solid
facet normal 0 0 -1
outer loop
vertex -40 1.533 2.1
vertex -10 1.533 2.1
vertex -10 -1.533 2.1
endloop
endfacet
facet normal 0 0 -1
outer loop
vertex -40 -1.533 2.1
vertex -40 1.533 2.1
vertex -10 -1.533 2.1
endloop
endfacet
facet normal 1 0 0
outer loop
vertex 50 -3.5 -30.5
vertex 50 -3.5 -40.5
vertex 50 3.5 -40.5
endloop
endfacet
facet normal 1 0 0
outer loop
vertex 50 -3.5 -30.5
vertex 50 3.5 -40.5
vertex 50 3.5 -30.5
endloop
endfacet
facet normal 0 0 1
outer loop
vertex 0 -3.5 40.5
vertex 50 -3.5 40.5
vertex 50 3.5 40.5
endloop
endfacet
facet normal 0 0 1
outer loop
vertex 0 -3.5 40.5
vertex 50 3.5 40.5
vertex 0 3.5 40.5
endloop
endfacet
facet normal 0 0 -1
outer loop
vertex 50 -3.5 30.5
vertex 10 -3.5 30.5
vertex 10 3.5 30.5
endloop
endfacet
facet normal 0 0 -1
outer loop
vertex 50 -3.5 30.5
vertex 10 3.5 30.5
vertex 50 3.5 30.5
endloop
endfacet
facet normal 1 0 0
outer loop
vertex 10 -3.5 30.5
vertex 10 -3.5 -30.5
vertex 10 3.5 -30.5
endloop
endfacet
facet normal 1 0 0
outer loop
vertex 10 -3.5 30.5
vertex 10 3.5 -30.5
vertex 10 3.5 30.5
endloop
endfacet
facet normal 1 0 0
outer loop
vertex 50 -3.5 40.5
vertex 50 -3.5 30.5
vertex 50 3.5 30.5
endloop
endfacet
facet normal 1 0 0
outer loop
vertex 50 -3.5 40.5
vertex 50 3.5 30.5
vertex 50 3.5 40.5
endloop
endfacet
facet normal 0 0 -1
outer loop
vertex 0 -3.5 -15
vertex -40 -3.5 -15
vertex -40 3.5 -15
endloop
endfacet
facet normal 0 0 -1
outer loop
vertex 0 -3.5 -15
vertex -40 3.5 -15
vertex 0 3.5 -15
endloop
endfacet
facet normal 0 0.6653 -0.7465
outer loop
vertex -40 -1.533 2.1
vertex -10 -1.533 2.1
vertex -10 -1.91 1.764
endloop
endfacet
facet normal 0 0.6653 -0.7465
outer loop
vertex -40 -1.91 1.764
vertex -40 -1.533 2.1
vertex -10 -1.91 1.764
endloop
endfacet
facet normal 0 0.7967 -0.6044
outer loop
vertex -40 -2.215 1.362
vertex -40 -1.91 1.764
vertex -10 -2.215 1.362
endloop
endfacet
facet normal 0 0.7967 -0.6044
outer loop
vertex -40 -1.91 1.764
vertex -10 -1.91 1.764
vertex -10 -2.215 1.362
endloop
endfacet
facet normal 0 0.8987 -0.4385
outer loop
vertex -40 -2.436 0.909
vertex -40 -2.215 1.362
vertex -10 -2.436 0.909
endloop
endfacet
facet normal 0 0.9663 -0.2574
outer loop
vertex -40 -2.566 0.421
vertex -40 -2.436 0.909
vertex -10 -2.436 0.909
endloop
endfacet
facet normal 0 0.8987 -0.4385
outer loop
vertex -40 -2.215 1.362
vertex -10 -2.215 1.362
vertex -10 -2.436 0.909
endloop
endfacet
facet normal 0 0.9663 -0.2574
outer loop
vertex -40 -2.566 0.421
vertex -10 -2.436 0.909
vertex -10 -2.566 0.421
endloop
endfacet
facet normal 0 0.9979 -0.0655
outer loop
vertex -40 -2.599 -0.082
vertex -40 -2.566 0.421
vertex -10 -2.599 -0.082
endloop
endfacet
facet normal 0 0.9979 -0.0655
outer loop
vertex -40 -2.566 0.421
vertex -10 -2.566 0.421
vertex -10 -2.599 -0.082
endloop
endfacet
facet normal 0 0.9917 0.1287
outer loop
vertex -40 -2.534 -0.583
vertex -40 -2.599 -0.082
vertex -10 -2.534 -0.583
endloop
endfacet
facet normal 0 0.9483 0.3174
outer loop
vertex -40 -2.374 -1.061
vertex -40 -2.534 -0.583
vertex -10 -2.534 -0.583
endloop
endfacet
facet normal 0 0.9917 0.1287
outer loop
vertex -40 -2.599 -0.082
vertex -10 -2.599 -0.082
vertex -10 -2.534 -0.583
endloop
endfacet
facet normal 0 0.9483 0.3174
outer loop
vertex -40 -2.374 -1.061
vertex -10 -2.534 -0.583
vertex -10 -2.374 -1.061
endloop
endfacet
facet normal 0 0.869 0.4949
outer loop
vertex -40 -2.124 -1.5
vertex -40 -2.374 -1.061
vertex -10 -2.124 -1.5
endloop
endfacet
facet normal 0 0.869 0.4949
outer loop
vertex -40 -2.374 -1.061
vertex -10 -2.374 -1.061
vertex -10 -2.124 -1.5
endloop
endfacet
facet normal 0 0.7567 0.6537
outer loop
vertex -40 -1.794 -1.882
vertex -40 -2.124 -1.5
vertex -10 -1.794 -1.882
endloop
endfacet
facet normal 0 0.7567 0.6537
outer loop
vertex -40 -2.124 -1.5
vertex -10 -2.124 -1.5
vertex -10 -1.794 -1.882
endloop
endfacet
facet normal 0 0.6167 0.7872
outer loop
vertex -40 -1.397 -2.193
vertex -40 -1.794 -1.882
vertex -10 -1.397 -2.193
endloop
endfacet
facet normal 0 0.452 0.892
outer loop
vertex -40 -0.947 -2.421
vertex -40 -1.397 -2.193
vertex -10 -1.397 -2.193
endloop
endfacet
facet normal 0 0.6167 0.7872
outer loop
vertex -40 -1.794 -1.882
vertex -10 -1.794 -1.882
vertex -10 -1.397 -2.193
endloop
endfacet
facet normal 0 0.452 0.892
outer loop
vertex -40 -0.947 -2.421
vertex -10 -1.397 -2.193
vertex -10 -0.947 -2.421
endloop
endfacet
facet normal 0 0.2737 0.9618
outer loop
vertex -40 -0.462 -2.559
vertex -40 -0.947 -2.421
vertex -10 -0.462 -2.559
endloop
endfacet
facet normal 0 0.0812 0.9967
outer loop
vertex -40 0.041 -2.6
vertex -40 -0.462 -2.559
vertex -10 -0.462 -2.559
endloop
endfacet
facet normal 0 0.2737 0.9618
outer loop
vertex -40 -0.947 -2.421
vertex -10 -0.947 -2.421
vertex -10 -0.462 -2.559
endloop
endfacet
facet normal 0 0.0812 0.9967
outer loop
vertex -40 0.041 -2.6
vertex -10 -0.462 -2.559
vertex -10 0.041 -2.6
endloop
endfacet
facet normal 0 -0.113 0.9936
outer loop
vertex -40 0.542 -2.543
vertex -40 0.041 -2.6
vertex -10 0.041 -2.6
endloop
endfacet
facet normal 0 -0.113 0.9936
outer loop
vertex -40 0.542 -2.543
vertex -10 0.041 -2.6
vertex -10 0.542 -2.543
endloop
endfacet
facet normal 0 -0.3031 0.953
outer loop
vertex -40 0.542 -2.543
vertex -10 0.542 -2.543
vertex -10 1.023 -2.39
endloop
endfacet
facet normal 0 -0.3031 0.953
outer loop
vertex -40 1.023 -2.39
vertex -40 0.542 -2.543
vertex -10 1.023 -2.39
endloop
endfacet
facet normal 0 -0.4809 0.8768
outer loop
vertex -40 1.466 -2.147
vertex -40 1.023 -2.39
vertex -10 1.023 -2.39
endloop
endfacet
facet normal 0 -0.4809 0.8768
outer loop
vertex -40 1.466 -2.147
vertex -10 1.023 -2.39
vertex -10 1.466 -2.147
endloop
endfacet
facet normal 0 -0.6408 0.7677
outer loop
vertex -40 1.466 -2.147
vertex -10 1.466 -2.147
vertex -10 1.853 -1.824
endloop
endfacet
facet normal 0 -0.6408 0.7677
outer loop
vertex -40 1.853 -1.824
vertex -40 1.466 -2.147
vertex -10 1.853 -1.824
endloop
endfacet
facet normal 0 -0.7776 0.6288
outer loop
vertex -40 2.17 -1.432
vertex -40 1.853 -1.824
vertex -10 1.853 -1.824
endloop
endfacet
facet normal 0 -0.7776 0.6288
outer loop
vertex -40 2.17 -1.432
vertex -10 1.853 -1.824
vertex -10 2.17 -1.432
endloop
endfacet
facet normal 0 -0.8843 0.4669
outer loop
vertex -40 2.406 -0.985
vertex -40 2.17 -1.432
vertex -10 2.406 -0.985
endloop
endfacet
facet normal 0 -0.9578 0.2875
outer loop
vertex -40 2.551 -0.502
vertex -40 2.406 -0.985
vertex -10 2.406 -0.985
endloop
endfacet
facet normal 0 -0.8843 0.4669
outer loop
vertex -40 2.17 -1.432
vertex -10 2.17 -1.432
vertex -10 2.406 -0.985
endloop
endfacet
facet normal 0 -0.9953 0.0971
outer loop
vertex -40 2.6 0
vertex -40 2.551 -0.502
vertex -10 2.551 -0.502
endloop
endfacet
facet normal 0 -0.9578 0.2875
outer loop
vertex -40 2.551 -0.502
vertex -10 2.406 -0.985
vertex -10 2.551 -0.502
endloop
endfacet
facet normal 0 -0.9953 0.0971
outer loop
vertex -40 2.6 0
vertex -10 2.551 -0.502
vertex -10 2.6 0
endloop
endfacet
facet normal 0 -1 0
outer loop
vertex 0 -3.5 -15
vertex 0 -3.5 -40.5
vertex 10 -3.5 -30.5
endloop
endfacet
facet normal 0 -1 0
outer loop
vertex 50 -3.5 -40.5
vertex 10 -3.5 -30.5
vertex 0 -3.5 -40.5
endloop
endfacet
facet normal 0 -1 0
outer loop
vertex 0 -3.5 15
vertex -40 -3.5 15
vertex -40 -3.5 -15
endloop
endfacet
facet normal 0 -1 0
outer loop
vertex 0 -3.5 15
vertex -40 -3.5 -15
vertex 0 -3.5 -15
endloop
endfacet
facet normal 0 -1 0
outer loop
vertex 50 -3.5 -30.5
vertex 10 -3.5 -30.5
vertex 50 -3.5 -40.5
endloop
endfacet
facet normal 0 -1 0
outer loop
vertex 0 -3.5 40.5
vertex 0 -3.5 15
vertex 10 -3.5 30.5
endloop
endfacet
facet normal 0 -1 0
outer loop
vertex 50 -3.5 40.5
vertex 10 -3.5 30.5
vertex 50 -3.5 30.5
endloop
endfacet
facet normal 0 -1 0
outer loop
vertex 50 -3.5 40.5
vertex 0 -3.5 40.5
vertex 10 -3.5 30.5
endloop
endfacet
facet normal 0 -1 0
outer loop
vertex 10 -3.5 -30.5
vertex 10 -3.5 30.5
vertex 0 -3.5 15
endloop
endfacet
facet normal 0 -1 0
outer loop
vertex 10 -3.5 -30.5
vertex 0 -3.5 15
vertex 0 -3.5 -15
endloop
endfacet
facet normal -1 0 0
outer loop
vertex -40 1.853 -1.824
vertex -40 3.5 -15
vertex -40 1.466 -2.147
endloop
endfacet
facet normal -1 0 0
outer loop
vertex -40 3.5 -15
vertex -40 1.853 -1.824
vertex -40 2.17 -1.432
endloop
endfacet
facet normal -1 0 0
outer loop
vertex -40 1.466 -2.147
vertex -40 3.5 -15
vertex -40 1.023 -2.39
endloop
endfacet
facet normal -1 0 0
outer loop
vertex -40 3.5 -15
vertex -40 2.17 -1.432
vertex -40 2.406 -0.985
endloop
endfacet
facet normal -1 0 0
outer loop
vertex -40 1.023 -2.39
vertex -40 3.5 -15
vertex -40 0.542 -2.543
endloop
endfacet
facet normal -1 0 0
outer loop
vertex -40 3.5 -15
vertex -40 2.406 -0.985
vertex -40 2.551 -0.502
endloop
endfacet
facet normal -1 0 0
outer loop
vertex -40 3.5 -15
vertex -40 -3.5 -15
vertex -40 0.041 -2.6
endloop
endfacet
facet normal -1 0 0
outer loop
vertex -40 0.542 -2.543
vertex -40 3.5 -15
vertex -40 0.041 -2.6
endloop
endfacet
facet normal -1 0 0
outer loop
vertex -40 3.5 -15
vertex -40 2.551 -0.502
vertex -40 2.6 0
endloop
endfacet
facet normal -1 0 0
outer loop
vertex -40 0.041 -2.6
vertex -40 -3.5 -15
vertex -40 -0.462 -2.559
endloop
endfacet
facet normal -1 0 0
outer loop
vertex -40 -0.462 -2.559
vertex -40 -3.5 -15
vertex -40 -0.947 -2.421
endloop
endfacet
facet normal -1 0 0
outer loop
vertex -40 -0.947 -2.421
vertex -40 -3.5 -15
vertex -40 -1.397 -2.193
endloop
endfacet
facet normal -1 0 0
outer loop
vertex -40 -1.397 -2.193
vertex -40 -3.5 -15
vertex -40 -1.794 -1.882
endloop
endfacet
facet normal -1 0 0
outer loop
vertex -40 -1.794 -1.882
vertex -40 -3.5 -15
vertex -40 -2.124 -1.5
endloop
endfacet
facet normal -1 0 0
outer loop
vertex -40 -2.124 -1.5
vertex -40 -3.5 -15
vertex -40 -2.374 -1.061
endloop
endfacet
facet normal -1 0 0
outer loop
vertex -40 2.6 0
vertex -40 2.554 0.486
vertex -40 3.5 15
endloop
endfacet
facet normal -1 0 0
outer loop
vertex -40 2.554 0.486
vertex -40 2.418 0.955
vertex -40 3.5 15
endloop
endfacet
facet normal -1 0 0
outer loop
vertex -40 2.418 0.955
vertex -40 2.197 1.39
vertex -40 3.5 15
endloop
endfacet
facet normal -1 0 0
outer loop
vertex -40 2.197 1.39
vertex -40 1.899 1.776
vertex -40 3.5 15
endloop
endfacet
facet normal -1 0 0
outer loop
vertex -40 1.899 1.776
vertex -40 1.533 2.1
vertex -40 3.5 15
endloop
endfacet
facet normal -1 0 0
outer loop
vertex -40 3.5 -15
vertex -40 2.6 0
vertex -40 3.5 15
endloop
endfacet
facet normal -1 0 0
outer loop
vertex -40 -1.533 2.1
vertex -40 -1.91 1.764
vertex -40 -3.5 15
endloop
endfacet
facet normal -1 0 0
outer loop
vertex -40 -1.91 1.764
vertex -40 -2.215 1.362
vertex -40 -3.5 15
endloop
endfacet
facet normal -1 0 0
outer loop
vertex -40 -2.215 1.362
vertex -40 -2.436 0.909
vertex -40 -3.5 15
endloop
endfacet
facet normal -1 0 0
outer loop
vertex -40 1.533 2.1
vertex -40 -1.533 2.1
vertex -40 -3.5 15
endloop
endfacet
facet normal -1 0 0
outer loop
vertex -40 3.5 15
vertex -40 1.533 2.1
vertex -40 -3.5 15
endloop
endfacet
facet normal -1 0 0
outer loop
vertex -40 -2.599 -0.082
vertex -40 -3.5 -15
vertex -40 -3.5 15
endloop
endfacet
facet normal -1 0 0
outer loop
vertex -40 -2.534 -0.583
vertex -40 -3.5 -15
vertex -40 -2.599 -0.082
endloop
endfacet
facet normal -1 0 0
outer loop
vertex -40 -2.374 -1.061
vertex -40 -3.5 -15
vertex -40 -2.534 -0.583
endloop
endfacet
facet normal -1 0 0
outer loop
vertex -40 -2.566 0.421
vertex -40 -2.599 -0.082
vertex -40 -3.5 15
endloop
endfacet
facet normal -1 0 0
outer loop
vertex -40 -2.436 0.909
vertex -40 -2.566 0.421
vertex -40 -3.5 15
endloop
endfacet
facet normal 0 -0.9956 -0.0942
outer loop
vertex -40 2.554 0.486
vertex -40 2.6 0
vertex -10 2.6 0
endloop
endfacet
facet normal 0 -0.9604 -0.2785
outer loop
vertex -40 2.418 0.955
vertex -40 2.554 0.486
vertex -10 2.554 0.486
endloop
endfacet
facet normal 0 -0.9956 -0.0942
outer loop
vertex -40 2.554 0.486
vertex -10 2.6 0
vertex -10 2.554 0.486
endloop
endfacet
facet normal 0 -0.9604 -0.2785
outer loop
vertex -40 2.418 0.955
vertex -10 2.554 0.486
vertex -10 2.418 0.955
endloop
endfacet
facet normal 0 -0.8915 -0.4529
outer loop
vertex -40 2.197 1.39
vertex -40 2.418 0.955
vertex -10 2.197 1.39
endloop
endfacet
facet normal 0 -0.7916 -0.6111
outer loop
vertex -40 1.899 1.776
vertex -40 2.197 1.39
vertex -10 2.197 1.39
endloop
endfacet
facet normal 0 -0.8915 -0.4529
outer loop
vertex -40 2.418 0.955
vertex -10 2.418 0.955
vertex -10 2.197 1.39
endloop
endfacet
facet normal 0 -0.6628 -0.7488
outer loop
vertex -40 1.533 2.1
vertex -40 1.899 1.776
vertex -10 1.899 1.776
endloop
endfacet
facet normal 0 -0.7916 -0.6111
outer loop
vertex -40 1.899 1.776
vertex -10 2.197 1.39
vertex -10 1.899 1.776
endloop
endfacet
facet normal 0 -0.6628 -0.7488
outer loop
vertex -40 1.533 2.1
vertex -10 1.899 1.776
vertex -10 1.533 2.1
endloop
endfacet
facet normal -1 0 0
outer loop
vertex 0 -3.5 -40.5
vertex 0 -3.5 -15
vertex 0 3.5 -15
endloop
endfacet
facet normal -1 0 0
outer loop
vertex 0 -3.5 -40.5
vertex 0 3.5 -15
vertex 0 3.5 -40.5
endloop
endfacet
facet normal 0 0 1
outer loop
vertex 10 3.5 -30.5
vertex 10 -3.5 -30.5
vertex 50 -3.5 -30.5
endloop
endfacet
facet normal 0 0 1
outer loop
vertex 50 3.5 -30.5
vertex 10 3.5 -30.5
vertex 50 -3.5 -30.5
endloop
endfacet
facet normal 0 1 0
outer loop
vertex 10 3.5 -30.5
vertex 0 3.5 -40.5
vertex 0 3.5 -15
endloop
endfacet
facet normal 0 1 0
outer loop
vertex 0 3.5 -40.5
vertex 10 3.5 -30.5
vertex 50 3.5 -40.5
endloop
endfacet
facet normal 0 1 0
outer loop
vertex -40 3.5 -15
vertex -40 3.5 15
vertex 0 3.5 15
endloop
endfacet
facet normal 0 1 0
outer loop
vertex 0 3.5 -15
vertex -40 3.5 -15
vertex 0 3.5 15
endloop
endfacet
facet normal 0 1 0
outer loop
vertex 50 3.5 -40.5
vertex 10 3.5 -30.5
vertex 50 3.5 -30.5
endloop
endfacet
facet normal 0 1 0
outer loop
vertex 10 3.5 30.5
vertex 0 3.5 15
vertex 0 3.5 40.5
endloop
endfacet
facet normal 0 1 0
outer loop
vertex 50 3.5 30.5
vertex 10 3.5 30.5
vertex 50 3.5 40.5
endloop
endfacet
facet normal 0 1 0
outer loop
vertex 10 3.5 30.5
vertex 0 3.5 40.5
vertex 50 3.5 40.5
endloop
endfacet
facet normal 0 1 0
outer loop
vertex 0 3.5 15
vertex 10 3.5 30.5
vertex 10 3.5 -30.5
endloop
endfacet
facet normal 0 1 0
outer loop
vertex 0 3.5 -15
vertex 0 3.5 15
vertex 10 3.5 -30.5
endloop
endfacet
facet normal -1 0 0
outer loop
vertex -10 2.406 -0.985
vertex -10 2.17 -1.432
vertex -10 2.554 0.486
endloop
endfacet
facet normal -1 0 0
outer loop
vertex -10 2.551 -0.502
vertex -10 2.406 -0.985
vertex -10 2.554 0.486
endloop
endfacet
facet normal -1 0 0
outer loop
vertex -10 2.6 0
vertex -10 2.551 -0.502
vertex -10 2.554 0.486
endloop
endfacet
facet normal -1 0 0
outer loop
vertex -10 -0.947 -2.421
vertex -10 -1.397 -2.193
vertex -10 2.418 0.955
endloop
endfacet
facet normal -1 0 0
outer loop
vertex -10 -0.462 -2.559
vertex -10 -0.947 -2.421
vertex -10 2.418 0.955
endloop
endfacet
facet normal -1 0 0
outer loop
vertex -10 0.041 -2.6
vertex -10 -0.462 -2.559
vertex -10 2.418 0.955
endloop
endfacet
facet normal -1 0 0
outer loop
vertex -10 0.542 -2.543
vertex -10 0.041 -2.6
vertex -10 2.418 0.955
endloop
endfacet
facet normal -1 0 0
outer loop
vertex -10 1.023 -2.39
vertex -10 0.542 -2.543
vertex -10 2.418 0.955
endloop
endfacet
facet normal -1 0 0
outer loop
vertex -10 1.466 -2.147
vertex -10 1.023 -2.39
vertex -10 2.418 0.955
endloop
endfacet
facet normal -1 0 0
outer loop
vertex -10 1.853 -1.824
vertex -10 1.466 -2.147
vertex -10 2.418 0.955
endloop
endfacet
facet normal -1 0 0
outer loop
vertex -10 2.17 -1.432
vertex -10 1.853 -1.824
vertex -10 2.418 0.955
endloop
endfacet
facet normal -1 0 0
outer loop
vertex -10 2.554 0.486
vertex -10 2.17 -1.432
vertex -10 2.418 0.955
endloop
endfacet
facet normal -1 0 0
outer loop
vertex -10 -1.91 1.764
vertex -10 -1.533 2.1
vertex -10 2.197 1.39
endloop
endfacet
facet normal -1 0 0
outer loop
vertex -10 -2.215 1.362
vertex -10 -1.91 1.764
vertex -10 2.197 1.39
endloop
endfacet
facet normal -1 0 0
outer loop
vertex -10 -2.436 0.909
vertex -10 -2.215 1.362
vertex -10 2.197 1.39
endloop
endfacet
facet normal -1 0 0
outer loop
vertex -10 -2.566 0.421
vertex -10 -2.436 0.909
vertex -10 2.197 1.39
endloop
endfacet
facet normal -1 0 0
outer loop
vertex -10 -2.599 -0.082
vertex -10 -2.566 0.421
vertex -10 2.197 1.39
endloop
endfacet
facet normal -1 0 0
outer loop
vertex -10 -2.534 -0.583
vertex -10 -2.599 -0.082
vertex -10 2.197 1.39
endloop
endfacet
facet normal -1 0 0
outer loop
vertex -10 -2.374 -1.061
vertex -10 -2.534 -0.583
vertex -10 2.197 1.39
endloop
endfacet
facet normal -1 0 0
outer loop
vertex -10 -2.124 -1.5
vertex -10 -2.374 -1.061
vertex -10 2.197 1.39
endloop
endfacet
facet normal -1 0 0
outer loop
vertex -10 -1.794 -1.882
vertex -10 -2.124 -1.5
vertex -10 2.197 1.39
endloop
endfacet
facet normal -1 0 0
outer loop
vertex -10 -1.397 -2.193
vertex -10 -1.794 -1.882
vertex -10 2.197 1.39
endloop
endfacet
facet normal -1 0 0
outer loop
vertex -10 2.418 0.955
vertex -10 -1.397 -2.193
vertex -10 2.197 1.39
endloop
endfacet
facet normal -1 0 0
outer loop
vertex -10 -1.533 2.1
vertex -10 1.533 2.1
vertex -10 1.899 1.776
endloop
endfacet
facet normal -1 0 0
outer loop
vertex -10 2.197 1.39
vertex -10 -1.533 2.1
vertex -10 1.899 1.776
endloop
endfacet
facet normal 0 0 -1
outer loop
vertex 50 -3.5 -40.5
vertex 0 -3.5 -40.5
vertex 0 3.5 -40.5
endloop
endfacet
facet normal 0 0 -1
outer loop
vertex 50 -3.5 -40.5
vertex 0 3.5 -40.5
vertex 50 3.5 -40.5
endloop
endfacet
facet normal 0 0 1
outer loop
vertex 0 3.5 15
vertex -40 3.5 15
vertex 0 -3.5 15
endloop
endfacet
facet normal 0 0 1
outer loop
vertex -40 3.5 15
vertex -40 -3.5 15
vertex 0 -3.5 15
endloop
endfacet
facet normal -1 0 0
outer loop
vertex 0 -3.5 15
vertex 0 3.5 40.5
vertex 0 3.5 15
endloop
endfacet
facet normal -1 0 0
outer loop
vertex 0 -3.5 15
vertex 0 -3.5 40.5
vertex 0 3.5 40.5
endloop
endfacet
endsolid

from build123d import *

# Parameters (mm, degrees)
F0_W     = 40
F0_H     = 30
F0_H_2   = 10
F1_DEPTH = 3.5
F3_START = -10
F3_DEPTH = 30


with BuildPart() as f1:
    # F0 (on Front) → F1 (new body, symmetric)
    with BuildSketch(Plane.XZ):
        with Locations((-20, 0)):
            Rectangle(F0_W, F0_H)
        Polygon((0, 40.5), (0, 15), (0, -15), (0, -40.5), (10, -40.5), (10, -30.5), (10, 30.5), (10, 40.5), align=None)
        with Locations((30, 35.5)):
            Rectangle(F0_W, F0_H_2)
        with Locations((30, -35.5)):
            Rectangle(F0_W, F0_H_2)
    extrude(amount=F1_DEPTH, both=True)

    # F2 (on Right) → F3 (cut)
    with BuildSketch(Plane.YZ.offset(F3_START)):
        with BuildLine():
            ThreePointArc((-1.5329709717, 2.1), (-1.1777681167, -2.3179435418), (2.6, 0))
            ThreePointArc((2.6, 0), (2.3179435418, 1.1777681167), (1.5329709717, 2.1))
            Line((1.5329709717, 2.1), (-1.5329709717, 2.1))
        make_face()
    extrude(amount=-F3_DEPTH, mode=Mode.SUBTRACT)


solid = f1.part
